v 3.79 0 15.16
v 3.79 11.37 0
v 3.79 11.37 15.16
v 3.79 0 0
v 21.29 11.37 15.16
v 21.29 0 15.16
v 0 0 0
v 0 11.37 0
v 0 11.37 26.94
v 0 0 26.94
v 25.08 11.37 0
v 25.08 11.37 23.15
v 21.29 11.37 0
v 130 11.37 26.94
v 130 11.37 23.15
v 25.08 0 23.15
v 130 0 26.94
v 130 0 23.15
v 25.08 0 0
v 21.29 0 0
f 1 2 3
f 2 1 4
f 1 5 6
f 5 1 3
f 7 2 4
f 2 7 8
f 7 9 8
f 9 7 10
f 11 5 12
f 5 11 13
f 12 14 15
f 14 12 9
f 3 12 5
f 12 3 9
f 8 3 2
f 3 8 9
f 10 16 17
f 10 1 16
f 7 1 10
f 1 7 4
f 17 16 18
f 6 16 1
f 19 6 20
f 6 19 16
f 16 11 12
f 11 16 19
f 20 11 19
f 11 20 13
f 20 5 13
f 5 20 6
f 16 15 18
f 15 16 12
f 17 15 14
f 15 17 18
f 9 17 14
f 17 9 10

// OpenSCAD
$fn=36;

//Dicke der Elemente
t=3.79;
//Dicker des unteren Brettes + Toleranz
b=16.5+1;
//Tiefe
d=t*3;
//Höhe Bottom Connector
hbc=t*4;
//Kabelabstand
ka=t+0.42*10; //=7.99
//Tiefe Brett
tb=260;
//Tiefe Connector oben
tco=tb/2;

//Unterer Verbinder (eine Wand)
module connectorwallbottom()
{
    cube([t,d,hbc]);
}

connectorwallbottom();

translate([t+b,0,0])
connectorwallbottom();

color("red")
translate([0,0,hbc])
cube([t+b+t,d,ka]);

translate([0,0,hbc+ka])
cube([tco,d,t]);
